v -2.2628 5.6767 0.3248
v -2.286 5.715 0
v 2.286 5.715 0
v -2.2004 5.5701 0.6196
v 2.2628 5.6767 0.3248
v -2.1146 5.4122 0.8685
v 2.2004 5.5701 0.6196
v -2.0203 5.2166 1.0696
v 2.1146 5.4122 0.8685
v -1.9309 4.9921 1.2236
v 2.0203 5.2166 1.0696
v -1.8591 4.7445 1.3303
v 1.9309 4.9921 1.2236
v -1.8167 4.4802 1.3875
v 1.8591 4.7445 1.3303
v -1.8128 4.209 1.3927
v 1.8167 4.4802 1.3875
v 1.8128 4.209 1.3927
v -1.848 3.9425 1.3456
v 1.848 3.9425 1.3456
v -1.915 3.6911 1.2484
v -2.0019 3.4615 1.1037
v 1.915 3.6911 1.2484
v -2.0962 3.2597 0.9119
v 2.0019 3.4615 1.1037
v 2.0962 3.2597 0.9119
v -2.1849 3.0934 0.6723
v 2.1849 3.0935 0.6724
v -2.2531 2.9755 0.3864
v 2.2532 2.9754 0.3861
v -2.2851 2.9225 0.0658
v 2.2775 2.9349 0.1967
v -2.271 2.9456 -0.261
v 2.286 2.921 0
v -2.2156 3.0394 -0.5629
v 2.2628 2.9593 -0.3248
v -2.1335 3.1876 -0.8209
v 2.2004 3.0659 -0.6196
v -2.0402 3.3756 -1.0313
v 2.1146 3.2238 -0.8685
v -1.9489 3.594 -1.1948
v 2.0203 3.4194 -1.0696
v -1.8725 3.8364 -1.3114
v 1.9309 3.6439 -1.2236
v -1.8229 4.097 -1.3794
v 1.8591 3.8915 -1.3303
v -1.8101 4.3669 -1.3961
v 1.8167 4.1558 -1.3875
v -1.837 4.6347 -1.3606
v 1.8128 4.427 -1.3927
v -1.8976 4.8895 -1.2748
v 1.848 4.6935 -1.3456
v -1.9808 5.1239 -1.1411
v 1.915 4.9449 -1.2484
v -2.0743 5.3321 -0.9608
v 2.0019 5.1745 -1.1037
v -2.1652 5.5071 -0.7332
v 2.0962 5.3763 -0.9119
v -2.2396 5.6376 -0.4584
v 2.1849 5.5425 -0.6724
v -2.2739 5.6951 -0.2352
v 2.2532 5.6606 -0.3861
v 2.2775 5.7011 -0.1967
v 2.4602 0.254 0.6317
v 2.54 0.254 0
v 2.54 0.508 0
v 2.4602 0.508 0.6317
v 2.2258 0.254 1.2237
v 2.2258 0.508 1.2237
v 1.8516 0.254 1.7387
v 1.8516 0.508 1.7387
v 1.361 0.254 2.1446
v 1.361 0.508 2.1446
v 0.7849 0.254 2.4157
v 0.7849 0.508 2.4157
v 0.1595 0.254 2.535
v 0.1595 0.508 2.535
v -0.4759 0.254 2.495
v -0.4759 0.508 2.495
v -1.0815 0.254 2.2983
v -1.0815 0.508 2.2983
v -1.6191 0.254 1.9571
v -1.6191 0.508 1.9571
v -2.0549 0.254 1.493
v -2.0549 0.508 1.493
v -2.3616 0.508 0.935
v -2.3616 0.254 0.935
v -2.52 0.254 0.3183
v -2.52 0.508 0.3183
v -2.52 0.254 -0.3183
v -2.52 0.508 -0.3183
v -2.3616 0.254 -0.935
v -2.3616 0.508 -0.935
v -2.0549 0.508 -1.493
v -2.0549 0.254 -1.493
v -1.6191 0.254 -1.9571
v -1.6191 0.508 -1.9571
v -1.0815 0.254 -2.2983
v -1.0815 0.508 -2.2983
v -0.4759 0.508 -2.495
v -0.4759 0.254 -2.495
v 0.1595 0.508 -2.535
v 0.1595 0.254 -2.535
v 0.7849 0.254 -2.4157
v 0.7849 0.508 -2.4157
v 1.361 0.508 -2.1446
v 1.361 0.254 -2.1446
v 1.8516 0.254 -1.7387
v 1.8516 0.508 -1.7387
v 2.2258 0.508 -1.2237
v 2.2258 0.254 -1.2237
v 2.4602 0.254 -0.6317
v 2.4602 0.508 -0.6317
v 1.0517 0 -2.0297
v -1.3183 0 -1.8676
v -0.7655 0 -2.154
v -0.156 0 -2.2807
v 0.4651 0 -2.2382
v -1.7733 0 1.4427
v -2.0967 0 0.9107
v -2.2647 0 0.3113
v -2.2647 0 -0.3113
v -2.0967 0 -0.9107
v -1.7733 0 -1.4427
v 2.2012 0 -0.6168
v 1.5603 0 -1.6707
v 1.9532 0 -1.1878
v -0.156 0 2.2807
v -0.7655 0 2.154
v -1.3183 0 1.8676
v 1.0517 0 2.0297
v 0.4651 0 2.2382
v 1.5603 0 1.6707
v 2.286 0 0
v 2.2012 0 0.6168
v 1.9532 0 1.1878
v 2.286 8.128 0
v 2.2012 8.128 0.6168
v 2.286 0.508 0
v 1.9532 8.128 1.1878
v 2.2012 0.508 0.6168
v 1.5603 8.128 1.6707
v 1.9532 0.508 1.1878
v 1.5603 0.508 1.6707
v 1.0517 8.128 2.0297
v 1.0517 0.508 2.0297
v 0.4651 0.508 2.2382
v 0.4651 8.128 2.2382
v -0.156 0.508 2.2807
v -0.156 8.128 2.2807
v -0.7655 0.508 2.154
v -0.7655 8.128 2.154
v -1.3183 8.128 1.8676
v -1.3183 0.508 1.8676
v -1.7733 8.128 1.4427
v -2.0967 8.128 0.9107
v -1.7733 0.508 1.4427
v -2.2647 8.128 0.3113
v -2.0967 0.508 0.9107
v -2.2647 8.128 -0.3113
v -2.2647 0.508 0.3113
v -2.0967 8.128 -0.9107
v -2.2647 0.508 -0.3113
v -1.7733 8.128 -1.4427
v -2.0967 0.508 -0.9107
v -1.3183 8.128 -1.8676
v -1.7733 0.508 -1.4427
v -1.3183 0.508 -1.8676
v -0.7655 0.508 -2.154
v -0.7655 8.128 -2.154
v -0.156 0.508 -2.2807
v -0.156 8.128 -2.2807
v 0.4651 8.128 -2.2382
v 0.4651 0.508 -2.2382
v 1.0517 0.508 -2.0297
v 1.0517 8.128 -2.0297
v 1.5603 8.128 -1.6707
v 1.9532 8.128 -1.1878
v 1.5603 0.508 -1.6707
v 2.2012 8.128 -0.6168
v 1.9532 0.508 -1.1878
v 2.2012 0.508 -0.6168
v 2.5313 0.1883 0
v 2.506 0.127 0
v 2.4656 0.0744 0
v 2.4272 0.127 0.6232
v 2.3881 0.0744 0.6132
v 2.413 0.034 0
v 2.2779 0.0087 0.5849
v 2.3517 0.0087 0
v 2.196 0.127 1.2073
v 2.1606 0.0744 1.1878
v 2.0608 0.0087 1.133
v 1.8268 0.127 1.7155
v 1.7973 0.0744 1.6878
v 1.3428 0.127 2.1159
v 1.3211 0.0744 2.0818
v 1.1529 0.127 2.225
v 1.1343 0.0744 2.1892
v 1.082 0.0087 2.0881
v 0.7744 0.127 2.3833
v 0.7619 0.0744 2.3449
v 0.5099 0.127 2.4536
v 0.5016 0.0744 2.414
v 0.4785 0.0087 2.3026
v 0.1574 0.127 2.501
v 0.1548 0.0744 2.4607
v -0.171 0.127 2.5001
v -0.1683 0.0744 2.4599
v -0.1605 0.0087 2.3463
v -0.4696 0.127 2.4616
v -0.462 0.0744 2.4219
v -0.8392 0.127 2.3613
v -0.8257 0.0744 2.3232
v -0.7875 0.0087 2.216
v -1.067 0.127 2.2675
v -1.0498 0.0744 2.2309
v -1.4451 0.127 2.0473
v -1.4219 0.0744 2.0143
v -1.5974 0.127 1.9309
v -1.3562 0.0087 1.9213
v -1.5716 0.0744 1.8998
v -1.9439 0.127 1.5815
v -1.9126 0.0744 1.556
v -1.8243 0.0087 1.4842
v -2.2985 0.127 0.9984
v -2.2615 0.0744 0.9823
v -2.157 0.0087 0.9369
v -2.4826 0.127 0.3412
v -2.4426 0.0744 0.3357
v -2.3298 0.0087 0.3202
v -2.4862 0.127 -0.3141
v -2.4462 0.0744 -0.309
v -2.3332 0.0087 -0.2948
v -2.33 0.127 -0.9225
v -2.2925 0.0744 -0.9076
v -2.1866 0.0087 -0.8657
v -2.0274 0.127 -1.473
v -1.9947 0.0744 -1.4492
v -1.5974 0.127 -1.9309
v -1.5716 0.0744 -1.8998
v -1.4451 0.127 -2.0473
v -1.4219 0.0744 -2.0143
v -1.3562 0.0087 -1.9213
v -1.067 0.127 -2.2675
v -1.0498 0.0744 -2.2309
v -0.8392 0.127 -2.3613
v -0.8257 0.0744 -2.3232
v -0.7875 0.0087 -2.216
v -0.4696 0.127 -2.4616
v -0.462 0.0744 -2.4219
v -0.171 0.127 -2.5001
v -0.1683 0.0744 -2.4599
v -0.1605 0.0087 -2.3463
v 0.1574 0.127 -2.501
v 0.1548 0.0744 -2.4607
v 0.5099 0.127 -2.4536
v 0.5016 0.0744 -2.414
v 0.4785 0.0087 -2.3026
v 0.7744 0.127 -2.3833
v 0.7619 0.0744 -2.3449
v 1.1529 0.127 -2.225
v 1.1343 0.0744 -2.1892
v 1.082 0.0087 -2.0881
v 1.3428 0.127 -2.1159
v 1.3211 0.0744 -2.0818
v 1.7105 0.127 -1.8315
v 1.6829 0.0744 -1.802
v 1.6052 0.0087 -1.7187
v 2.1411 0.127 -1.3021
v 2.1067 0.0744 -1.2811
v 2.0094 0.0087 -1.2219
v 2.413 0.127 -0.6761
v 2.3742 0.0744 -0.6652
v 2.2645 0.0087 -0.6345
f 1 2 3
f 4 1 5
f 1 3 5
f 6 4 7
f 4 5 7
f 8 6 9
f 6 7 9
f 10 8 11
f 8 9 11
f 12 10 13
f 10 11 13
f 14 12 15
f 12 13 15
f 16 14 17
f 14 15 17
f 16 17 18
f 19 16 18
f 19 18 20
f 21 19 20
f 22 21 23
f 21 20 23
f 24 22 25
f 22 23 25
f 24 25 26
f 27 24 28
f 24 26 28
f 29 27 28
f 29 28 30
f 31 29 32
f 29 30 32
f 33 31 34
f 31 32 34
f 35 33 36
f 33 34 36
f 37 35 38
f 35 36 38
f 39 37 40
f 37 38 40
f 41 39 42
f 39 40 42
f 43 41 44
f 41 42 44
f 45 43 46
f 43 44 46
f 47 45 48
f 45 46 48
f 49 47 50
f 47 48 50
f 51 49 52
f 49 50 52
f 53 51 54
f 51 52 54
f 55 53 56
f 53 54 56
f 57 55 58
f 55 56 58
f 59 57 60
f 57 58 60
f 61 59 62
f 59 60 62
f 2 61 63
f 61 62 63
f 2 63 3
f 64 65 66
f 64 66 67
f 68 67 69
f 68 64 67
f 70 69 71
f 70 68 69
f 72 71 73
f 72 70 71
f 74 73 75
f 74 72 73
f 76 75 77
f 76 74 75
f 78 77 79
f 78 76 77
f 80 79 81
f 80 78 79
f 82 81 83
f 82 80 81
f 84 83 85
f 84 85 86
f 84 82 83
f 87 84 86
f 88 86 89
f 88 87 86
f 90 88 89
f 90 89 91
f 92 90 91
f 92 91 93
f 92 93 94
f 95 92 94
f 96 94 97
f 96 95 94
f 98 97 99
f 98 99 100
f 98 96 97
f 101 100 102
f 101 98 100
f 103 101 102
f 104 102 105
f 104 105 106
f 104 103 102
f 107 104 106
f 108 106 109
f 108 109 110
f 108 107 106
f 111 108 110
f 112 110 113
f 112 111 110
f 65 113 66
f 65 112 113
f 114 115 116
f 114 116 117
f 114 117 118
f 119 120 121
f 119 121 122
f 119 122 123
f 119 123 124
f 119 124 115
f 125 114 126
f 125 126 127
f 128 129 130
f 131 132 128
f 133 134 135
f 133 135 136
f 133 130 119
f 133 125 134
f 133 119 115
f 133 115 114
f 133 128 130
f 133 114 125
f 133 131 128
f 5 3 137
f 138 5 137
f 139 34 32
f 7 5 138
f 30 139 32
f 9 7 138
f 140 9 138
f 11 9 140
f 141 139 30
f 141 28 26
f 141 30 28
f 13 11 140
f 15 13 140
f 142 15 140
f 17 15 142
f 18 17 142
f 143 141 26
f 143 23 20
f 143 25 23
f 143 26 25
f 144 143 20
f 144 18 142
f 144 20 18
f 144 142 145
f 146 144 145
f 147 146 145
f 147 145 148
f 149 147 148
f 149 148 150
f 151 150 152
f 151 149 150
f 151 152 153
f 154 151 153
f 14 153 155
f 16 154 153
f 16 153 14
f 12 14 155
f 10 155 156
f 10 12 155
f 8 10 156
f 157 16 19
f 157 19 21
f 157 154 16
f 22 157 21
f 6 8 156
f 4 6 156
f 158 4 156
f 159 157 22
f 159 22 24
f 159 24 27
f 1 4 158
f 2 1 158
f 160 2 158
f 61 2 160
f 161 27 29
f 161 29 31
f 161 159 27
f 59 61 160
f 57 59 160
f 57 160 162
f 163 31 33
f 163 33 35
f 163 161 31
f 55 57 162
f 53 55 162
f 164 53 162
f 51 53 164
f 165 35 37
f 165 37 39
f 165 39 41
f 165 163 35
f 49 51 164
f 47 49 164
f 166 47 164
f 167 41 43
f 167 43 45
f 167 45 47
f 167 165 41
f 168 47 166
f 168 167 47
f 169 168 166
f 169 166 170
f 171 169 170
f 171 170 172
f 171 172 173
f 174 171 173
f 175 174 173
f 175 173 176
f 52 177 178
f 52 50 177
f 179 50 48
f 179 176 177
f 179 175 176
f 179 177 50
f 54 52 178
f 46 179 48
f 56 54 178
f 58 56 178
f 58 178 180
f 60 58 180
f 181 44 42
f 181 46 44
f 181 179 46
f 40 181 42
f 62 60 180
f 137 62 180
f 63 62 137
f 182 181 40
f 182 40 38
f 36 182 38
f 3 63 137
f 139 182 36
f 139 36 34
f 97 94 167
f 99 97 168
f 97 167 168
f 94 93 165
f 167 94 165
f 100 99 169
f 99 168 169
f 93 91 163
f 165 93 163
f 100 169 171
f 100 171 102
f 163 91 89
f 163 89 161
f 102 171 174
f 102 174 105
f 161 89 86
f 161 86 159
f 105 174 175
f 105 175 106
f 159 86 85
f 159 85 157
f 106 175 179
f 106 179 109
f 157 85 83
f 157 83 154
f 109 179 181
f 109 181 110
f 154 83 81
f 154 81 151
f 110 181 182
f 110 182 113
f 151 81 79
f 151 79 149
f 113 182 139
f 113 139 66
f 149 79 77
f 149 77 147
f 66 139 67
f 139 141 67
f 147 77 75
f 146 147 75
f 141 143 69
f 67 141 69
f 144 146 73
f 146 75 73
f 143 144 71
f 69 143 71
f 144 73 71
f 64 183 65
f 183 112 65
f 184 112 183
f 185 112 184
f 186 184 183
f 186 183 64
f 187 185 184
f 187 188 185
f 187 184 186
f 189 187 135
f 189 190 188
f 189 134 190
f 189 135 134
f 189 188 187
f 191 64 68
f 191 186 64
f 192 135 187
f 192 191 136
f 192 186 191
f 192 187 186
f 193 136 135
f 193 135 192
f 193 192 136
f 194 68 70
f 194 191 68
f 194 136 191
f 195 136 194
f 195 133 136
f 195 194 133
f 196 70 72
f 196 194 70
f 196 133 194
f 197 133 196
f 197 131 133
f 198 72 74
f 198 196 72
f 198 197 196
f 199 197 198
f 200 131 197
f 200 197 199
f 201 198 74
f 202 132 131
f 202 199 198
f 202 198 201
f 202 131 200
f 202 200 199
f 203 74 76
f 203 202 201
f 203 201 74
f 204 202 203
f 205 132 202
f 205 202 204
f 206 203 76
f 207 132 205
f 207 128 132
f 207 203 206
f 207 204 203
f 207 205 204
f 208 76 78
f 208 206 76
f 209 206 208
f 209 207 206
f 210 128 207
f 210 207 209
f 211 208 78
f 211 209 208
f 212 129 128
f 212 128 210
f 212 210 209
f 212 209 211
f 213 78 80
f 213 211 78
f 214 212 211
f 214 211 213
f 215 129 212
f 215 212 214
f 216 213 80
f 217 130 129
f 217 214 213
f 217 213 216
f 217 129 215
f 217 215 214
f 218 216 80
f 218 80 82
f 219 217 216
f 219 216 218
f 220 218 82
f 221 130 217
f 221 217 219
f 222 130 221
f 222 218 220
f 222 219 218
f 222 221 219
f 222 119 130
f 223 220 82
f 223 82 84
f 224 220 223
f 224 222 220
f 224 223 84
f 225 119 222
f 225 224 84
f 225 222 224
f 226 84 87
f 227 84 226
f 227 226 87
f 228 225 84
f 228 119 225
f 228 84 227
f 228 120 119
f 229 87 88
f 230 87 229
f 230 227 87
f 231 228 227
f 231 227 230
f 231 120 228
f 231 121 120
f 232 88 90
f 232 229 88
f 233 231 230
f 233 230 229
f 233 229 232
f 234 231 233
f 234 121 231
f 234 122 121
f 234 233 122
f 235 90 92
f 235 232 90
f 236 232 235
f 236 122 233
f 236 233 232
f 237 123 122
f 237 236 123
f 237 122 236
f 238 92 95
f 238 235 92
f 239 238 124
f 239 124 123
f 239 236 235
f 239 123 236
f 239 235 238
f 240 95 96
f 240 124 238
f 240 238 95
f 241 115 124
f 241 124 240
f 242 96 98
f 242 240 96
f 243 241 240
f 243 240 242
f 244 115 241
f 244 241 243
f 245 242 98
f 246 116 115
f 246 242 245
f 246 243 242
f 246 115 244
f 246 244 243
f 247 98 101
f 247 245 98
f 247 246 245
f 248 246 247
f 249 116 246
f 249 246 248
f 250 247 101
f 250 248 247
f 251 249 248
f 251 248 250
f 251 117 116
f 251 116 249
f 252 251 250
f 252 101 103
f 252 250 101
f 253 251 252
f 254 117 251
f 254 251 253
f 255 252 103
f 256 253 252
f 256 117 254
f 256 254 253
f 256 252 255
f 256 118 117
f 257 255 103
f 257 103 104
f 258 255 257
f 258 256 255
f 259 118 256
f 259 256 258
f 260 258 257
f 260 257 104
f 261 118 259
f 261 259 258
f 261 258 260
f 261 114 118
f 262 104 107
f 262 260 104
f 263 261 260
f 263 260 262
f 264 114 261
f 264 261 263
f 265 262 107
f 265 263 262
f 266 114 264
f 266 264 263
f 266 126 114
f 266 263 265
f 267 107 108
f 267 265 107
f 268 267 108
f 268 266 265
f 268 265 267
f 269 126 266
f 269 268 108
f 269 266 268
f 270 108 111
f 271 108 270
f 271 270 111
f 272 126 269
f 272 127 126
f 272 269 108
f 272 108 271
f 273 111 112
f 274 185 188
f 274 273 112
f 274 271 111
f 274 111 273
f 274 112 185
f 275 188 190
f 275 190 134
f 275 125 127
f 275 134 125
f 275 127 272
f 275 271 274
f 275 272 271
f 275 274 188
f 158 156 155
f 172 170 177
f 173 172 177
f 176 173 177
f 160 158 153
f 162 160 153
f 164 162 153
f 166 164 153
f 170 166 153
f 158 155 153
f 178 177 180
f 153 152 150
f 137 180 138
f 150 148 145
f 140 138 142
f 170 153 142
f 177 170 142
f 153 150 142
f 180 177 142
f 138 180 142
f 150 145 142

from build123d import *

# Parameters (mm, degrees)
F0_R     = 2.286
F1_DEPTH = 8.128
F0_R_2   = 2.54
F2_DEPTH = 0.508
F3_R     = 1.397
F4_DEPTH = 12.7
F5_R     = 0.254


with BuildPart() as f1:
    # F0 (on Front) → F1 (new body)
    with BuildSketch(Plane.XZ):
        Circle(F0_R)
    extrude(amount=-F1_DEPTH)

    # F0 (on Front) → F2 (join)
    with BuildSketch(Plane.XZ):
        Circle(F0_R_2)
        Circle(F0_R, mode=Mode.SUBTRACT)
    extrude(amount=-F2_DEPTH)

    # F3 (on Right) → F4 (cut, symmetric)
    with BuildSketch(Plane.YZ):
        with Locations((4.318, 0)):
            Circle(F3_R)
    extrude(amount=F4_DEPTH, both=True, mode=Mode.SUBTRACT)

    # F5
    f5_edges = [f1.edges().sort_by_distance(p)[0] for p in [
        (-2.54, 0, 0),
    ]]
    fillet(f5_edges, radius=F5_R)


solid = f1.part
